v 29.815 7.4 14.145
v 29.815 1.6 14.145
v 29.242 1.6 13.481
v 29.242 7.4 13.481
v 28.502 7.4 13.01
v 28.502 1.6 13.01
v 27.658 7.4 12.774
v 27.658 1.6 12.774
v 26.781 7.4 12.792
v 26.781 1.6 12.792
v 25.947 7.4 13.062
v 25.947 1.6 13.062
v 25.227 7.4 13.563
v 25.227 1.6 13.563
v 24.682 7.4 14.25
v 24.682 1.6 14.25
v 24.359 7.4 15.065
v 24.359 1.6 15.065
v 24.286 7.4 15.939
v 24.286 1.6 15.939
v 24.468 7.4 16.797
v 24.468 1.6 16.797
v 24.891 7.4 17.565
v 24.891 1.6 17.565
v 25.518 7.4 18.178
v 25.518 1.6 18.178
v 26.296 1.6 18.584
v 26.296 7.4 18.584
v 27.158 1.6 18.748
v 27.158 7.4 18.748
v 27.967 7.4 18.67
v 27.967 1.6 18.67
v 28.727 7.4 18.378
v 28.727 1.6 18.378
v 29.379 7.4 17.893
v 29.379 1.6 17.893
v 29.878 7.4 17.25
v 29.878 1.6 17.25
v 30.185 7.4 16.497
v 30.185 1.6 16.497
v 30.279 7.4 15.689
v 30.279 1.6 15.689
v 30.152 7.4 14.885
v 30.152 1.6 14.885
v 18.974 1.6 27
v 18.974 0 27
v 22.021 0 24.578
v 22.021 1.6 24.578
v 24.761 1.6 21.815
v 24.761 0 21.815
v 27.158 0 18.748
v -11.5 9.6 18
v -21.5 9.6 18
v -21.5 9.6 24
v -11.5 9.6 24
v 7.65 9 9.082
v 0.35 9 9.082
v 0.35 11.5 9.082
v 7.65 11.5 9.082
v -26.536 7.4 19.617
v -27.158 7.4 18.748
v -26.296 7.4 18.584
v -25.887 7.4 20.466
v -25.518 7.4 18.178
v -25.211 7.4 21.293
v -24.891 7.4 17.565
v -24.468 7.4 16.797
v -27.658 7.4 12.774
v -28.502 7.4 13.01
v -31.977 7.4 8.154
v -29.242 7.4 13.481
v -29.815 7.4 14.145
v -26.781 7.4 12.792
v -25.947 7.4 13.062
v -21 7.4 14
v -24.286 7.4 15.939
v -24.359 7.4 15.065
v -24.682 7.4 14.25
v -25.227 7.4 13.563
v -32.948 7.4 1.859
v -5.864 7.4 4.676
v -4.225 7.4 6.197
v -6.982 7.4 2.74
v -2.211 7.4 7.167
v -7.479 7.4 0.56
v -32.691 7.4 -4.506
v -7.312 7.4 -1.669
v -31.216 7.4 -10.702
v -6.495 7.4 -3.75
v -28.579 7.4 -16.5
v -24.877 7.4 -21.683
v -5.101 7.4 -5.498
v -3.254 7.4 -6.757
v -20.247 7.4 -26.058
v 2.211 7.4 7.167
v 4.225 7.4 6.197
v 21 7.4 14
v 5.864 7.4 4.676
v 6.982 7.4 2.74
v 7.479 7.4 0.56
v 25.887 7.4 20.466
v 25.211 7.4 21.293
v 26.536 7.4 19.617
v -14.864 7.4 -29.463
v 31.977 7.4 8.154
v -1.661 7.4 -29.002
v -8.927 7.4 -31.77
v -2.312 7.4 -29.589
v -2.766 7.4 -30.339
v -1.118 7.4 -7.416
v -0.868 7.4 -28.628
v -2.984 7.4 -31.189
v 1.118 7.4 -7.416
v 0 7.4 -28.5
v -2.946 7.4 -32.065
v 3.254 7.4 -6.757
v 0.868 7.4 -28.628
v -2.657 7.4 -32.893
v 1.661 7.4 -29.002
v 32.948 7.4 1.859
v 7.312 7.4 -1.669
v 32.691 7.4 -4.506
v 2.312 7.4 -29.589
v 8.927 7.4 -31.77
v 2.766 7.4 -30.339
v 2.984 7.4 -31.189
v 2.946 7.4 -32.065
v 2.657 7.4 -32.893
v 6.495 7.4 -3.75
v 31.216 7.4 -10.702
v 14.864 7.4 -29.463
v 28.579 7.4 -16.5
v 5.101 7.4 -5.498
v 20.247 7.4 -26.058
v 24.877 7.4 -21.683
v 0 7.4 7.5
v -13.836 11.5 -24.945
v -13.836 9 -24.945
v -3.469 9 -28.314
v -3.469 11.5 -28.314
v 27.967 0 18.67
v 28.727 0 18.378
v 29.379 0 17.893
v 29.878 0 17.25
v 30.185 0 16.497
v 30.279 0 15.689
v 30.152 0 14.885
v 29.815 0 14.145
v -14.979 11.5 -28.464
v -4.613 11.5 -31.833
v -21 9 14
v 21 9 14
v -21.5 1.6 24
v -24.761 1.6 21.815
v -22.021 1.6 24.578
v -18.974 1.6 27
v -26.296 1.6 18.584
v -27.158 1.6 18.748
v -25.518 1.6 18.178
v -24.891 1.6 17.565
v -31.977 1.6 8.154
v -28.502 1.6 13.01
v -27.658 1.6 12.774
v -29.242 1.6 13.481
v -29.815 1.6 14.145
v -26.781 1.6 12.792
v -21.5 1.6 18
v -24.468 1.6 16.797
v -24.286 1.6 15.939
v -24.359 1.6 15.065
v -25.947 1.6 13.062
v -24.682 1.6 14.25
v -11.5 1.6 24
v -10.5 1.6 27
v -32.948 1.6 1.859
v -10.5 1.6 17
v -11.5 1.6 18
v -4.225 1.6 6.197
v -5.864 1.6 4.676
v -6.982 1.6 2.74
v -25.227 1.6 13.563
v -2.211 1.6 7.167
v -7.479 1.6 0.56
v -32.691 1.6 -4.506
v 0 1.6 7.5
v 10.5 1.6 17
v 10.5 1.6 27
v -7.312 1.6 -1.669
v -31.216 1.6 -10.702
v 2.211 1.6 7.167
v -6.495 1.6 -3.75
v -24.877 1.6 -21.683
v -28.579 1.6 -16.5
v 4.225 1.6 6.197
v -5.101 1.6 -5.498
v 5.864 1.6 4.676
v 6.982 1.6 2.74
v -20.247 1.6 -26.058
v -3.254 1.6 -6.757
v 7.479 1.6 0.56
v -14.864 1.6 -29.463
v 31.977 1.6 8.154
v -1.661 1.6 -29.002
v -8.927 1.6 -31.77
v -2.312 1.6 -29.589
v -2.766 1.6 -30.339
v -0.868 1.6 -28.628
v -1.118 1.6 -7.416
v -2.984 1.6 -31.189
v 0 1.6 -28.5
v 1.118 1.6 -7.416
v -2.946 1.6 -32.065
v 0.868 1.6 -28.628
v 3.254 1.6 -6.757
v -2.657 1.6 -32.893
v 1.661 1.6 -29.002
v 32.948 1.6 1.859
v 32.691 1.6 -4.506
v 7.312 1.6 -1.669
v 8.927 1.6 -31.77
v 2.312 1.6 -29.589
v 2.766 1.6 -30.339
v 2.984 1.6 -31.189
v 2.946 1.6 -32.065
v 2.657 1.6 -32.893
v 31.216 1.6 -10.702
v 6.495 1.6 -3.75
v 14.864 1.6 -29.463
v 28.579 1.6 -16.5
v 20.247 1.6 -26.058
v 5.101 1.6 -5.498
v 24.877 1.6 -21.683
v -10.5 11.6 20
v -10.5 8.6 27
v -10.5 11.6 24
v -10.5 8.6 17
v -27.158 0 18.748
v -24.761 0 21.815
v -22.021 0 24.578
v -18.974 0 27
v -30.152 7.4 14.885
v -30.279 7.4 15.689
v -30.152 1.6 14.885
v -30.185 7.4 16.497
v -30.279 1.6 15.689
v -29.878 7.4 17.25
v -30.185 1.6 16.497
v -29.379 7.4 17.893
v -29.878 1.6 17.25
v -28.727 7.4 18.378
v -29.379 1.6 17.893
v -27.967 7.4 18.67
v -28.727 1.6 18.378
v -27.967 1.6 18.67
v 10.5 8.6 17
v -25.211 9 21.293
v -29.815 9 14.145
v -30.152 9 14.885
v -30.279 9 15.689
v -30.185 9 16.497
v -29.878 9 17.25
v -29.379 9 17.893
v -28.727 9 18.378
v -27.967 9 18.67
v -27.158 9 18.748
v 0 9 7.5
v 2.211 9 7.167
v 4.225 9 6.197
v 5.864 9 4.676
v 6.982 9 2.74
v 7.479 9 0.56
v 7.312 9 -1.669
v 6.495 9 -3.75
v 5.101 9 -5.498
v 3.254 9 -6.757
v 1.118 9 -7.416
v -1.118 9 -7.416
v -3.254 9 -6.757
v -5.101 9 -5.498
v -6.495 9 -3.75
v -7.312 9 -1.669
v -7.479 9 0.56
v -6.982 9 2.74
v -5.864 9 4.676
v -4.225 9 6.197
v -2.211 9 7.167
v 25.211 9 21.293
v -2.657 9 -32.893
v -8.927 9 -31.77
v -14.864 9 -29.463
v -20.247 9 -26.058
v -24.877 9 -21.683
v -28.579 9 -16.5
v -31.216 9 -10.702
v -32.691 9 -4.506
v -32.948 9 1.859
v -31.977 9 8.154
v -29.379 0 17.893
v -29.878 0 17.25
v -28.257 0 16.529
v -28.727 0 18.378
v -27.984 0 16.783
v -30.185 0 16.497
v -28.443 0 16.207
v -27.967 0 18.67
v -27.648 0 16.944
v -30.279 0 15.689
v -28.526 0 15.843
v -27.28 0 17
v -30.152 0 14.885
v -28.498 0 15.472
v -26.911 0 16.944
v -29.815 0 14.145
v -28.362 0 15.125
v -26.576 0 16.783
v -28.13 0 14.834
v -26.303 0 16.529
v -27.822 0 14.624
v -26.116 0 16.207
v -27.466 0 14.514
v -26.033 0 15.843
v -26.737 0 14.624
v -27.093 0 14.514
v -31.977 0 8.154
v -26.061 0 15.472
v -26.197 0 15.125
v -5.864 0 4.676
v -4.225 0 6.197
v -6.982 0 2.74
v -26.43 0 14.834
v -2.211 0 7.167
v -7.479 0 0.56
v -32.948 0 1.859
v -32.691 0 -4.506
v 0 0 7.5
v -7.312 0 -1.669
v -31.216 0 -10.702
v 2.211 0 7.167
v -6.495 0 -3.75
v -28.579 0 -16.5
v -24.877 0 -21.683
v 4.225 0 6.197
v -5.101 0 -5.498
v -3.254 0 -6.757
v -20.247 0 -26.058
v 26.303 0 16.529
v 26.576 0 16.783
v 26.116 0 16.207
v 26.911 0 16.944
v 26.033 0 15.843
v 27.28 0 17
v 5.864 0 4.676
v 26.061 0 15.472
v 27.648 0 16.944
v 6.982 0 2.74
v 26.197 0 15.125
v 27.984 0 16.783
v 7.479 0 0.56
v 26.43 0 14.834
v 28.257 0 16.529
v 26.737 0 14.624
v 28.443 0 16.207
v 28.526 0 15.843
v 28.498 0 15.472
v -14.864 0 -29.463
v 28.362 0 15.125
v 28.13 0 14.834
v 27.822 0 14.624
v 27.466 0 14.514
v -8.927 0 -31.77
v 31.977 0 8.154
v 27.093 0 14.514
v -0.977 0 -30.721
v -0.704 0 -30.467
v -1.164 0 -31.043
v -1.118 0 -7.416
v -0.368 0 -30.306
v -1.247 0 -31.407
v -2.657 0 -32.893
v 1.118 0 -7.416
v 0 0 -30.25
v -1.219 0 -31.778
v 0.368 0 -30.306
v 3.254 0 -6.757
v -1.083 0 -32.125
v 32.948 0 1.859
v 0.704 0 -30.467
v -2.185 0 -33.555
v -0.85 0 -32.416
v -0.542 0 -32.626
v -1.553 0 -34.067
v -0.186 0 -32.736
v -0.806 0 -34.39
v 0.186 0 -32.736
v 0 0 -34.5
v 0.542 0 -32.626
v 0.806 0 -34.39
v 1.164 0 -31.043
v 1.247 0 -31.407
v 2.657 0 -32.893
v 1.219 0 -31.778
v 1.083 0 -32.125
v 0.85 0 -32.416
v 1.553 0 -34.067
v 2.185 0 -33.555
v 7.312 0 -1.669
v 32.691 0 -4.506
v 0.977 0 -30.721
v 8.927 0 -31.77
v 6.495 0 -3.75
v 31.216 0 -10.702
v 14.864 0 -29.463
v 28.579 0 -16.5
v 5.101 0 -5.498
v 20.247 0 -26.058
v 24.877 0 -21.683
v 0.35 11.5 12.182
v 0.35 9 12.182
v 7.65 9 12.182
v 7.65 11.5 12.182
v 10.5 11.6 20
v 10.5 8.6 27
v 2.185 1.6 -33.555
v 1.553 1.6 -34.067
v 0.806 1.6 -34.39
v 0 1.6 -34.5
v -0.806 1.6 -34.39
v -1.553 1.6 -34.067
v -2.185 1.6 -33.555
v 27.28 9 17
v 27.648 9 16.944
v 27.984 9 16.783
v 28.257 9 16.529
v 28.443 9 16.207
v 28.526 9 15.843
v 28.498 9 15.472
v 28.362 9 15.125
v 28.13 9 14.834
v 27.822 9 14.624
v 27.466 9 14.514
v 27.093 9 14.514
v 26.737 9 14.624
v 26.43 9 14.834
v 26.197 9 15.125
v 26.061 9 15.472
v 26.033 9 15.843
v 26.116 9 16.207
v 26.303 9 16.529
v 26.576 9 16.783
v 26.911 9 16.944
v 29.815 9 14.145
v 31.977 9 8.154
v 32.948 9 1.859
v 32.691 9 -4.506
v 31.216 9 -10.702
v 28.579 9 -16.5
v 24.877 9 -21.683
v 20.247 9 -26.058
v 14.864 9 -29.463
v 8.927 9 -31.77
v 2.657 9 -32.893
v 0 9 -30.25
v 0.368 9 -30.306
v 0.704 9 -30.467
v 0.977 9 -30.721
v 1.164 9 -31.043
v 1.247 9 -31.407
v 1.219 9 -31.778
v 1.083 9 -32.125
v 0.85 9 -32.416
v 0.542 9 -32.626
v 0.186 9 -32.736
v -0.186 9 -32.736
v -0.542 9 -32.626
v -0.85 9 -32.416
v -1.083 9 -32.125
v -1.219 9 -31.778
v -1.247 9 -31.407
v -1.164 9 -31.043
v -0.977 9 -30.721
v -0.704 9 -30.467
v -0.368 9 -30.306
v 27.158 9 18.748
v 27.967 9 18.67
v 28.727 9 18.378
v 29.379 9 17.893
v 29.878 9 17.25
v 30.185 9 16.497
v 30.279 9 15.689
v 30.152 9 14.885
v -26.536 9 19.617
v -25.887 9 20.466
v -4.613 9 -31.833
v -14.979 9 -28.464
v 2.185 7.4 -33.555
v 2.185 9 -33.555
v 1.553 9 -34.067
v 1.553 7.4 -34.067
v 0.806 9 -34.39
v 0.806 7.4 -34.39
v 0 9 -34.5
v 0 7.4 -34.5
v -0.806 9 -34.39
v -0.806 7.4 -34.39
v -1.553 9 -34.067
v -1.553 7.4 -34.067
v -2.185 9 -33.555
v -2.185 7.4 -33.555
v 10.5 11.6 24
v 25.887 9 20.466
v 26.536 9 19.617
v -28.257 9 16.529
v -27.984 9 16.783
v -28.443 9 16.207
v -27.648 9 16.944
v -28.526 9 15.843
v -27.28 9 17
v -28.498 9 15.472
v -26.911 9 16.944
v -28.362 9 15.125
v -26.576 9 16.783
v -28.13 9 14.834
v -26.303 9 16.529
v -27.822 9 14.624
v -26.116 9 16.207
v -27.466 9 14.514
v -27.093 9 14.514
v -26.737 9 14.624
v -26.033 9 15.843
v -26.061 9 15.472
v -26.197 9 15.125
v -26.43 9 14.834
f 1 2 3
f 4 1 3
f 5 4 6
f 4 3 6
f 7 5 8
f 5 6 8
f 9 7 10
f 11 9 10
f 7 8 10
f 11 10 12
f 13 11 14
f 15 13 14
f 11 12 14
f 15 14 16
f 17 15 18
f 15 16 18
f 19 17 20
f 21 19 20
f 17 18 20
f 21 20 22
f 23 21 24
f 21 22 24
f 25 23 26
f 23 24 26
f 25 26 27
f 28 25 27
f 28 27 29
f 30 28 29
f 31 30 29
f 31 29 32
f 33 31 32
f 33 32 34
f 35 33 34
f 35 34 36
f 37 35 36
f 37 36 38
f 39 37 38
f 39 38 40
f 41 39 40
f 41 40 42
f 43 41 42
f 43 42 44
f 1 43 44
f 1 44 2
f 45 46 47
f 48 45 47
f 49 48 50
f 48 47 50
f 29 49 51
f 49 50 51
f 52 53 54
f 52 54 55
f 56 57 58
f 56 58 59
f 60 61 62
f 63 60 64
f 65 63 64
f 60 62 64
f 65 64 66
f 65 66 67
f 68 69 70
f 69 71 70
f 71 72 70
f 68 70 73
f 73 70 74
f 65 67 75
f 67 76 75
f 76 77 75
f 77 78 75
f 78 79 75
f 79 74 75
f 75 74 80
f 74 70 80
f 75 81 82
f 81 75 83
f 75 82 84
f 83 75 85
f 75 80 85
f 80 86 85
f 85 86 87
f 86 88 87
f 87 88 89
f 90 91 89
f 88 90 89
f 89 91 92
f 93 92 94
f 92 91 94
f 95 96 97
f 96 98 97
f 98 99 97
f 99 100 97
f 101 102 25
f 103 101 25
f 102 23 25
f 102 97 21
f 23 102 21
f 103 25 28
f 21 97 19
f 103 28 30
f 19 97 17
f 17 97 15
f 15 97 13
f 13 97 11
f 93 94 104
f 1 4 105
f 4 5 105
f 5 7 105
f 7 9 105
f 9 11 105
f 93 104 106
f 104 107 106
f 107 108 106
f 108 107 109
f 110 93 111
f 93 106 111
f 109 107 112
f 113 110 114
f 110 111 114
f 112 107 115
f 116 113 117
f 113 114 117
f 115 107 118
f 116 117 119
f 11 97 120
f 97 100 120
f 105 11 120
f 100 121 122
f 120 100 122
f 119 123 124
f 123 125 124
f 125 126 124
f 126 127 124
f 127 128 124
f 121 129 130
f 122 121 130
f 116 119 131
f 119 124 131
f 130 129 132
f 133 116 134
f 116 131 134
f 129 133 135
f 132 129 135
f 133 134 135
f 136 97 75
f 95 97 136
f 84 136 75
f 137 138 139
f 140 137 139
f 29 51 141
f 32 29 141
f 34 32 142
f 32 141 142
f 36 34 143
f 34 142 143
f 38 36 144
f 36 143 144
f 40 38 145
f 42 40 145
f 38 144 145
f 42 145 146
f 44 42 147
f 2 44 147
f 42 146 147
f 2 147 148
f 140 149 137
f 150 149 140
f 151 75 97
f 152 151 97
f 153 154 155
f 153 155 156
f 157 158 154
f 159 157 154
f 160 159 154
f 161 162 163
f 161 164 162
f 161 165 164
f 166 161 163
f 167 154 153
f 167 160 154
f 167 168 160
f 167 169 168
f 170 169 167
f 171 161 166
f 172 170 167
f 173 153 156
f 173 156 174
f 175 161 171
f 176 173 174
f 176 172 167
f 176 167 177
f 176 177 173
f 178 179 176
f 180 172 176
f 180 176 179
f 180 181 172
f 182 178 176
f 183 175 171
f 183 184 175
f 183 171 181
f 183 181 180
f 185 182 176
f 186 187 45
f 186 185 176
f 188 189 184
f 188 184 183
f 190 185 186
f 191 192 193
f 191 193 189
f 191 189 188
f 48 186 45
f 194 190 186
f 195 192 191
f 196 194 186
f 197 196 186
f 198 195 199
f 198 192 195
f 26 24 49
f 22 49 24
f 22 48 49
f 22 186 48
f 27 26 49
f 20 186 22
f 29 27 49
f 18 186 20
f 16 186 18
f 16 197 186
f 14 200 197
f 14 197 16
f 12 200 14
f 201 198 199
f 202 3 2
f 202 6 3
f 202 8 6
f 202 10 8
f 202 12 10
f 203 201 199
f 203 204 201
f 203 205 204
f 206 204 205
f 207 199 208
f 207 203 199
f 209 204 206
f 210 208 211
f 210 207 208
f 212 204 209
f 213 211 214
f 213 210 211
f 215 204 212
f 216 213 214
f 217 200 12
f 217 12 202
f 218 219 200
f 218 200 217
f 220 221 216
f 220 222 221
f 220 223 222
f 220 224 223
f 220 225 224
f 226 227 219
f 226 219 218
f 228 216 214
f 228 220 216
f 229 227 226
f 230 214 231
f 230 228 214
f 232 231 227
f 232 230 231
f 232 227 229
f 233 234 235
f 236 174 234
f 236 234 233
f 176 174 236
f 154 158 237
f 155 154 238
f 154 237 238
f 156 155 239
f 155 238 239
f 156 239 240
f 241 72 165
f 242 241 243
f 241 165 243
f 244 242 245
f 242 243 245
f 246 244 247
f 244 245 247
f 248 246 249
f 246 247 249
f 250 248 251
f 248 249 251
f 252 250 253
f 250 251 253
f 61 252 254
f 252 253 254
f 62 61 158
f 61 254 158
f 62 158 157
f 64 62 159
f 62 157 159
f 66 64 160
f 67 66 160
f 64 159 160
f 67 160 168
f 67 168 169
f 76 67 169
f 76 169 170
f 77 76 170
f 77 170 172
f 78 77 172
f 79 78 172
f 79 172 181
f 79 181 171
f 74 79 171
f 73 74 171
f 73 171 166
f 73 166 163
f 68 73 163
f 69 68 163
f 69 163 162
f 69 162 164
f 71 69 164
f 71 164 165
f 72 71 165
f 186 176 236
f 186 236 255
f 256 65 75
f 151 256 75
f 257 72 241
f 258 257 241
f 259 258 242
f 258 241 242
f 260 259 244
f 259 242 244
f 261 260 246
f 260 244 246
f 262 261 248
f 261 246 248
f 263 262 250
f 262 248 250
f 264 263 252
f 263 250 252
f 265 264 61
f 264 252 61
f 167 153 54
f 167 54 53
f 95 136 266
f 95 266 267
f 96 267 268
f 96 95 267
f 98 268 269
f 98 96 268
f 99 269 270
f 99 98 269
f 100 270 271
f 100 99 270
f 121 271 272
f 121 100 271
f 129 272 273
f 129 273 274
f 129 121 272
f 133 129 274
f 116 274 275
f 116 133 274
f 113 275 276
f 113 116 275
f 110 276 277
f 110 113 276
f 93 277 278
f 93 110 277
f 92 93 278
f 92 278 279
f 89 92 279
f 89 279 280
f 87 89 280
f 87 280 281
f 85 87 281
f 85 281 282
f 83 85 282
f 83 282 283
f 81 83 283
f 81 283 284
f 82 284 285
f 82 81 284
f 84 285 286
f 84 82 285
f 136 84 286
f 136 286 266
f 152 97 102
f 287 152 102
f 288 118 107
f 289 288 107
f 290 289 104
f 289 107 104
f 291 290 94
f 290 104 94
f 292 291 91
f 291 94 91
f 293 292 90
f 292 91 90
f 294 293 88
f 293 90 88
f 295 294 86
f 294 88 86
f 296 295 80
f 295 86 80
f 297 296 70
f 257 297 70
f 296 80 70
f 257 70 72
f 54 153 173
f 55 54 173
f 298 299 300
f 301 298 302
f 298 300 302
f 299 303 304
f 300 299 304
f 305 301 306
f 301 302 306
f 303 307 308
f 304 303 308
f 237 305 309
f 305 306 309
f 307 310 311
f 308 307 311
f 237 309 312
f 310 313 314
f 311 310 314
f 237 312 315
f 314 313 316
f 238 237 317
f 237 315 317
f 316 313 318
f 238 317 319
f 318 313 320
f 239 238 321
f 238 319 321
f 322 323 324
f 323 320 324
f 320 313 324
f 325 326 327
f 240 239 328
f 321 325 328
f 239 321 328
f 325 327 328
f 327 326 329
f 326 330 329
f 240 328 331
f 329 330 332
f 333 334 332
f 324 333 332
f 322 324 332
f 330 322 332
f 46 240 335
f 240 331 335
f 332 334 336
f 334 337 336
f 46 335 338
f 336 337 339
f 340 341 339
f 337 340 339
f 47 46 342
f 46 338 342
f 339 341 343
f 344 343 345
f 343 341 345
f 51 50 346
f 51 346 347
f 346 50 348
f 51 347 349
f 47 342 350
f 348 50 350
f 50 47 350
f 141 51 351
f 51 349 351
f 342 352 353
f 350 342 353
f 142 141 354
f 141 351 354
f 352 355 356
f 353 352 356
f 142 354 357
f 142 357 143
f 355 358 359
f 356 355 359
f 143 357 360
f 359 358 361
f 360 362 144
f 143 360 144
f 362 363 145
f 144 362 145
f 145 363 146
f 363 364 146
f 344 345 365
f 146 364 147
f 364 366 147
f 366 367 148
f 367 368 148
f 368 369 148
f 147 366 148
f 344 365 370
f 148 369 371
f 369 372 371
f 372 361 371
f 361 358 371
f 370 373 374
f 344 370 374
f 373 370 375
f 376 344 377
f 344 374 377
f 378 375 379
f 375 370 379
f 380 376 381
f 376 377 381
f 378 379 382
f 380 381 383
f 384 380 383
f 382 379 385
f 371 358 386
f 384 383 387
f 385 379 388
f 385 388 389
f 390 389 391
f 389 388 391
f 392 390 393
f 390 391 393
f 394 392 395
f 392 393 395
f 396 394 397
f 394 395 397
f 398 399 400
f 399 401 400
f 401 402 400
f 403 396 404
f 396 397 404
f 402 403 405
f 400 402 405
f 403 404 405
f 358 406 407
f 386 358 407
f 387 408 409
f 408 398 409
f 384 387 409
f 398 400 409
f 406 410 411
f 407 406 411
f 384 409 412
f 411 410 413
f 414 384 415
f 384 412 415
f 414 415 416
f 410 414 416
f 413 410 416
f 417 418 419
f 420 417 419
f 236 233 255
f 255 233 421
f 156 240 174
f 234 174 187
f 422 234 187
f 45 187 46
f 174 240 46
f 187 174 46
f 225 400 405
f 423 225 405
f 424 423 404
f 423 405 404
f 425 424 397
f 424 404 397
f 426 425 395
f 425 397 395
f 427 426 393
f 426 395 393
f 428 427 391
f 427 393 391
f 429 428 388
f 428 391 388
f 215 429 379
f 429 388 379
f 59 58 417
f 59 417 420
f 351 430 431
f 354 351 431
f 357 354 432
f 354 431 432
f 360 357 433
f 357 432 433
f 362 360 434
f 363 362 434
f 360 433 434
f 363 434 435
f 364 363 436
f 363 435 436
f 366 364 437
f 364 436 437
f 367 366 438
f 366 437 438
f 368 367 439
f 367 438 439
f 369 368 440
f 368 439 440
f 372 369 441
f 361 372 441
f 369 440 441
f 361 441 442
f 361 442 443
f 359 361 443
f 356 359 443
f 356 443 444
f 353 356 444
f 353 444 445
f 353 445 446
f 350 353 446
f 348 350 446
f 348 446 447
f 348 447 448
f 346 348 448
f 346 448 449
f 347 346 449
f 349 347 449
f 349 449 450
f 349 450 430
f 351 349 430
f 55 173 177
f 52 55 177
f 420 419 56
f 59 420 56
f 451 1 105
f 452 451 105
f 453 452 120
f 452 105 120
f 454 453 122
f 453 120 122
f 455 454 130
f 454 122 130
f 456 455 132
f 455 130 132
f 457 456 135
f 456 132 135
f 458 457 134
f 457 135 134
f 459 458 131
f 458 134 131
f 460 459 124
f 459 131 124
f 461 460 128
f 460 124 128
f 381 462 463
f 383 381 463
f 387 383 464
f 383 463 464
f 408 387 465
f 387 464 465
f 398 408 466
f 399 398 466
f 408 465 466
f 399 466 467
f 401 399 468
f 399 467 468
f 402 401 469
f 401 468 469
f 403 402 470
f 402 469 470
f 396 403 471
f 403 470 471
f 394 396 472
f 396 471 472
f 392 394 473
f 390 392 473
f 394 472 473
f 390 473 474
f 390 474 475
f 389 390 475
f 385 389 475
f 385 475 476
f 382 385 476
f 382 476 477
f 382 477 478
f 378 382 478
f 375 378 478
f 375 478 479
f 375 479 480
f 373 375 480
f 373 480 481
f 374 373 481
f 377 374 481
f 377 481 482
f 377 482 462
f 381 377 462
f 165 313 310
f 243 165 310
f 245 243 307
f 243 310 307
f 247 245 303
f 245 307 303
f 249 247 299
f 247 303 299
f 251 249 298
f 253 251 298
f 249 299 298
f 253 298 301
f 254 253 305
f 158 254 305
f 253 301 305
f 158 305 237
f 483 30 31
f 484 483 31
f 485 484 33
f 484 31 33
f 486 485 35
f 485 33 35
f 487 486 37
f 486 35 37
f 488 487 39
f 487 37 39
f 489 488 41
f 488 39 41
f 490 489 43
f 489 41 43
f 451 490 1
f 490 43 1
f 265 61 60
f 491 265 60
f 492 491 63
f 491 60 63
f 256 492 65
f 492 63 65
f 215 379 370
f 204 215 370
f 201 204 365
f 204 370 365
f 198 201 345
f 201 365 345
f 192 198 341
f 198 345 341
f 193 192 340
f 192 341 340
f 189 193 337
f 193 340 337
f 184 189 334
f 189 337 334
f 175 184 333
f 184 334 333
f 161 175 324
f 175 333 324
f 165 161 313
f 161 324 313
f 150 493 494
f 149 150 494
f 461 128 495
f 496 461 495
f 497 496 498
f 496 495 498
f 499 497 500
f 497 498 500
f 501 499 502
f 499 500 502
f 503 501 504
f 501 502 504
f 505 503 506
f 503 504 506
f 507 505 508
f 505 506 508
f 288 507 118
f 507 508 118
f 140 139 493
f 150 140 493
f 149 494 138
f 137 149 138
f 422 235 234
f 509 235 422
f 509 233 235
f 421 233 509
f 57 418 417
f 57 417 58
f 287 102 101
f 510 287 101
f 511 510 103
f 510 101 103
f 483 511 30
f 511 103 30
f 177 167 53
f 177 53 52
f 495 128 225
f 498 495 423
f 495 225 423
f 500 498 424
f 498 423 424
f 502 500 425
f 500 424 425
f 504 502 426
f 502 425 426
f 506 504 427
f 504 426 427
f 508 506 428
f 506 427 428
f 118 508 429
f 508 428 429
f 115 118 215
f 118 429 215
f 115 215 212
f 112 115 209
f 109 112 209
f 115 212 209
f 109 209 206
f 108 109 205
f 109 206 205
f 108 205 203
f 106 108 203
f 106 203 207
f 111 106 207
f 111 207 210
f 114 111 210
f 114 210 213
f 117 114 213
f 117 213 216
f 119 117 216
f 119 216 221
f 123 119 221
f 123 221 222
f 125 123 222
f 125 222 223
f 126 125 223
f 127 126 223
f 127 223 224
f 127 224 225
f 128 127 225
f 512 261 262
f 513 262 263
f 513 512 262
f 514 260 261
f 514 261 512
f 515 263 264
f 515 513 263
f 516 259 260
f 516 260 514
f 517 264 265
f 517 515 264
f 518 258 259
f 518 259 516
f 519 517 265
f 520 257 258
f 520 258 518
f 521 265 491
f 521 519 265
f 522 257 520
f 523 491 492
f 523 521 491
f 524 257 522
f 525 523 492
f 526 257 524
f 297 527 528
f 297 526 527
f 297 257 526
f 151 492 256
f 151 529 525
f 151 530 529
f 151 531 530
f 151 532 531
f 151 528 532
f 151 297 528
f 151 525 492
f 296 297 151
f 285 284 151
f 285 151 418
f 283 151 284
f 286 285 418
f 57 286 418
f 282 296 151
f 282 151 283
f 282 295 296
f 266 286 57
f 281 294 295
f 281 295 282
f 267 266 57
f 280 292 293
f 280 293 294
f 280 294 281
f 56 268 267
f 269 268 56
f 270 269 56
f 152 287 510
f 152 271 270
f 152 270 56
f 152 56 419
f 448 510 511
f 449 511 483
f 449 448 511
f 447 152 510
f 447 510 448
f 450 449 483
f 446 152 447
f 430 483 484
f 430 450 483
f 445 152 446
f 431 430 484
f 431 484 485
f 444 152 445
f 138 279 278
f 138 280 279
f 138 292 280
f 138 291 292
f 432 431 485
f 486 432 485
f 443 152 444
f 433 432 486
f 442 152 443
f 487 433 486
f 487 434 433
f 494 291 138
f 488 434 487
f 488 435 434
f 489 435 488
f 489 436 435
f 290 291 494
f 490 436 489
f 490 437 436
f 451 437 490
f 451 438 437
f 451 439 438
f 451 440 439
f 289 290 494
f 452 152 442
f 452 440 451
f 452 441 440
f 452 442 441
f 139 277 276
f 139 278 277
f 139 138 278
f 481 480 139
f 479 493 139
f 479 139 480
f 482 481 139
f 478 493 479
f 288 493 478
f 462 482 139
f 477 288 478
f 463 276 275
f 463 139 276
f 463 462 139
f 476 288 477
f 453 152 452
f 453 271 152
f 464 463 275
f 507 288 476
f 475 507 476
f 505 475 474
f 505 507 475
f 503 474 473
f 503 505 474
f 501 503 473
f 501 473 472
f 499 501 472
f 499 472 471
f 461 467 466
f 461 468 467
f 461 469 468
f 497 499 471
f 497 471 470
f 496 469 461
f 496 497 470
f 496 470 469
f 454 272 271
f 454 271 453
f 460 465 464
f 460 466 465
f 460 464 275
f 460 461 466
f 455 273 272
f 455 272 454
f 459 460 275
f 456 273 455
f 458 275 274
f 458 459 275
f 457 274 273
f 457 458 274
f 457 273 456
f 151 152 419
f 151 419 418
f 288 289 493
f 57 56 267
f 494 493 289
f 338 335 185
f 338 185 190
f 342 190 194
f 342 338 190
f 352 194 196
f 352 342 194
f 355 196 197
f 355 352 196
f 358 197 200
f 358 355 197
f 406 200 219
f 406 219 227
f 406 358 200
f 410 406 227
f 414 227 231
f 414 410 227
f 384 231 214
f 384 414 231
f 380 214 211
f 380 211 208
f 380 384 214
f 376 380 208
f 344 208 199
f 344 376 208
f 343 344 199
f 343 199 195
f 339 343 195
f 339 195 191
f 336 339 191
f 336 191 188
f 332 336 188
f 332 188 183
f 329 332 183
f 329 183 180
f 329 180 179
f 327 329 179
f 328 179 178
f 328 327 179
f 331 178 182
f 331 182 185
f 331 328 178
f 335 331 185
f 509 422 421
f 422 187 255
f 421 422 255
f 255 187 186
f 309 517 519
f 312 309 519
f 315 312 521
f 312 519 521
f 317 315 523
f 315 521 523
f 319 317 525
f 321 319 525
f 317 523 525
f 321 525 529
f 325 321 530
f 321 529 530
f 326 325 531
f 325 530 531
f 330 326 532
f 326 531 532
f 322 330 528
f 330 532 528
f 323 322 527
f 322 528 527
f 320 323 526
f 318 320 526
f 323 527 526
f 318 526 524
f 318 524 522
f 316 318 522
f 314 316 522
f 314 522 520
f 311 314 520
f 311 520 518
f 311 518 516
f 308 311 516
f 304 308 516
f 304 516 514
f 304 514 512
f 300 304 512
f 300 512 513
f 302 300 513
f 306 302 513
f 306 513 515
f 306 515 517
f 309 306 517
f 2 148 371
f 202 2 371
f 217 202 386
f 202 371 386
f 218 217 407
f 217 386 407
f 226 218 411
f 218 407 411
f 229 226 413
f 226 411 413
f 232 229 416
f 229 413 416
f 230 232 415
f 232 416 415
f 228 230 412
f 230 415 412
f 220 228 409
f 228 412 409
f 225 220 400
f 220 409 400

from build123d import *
from build123d.topology import SkipClean

# Parameters (mm, degrees)
SKETCH_1_R          = 7.5
EXTRUDE_1_DEPTH     = 1.6
SKETCH_4_R          = 3
EXTRUDE_2_DEPTH     = 5.8
SKETCH_6_R          = 7.5
EXTRUDE_3_DEPTH     = 1.6
SKETCH_7_W          = 21
SKETCH_7_H          = 10
EXTRUDE_4_DEPTH     = 10
CHAMFER_1_SIZE      = 3
SKETCH_8_W          = 10
SKETCH_8_H          = 6
EXTRUDE_5_DEPTH     = 8
SKETCH_9_W          = 7.3
SKETCH_9_H          = 3.1
EXTRUDE_6_DEPTH     = 2.5
EXTRUDE_7_DEPTH     = 2.5
CUT_EXTRUDE_3_REACH = 50.582
SKETCH_11_R         = 1.25
CUT_EXTRUDE_4_REACH = 50.778


with BuildPart() as part:
    # 草图1 → 凸台-拉伸1 (new body)
    with BuildSketch(Plane(origin=(0, 0, 0), x_dir=(1, 0, 0), z_dir=(0, 1, 0))):
        with BuildLine():
            ThreePointArc((-2.65705645, 32.892857143), (-28.578838325, 16.5), (-29.814578114, -14.145350186))
            ThreePointArc((-29.814578114, -14.145350186), (-29.877876431, -17.25), (-27.157521664, -18.747506957))
            ThreePointArc((-27.157521664, -18.747506957), (0, -33), (27.157521664, -18.747506957))
            ThreePointArc((27.157521664, -18.747506957), (29.877876431, -17.25), (29.814578114, -14.145350186))
            ThreePointArc((29.814578114, -14.145350186), (28.578838325, 16.5), (2.65705645, 32.892857143))
            ThreePointArc((2.65705645, 32.892857143), (0, 34.5), (-2.65705645, 32.892857143))
        make_face()
        with Locations(Location((0, 0, 0), (0, 0, 270))):
            Circle(SKETCH_1_R, mode=Mode.SUBTRACT)
    extrude(amount=EXTRUDE_1_DEPTH)

    # 草图4 → 凸台-拉伸2 (add)
    with BuildSketch(Plane(origin=(0, 1.6, 0), x_dir=(1, 0, 0), z_dir=(0, 1, 0))):
        with Locations(Location((0, 31.5, 0), (0, 0, 27.664004496))):
            Circle(SKETCH_4_R)
        with Locations(Location((27.279800219, -15.75, 0), (0, 0, 32.335995504))):
            Circle(SKETCH_4_R)
        with Locations(Location((-27.279800219, -15.75, 0), (0, 0, 147.664004496))):
            Circle(SKETCH_4_R)
    extrude(amount=EXTRUDE_2_DEPTH)

    # 草图6 → 凸台-拉伸3 (add)
    with SkipClean():  # the faces are left unmerged after this step: merging them gives an invalid solid
        with BuildSketch(Plane(origin=(0, 7.4, 0), x_dir=(1, 0, 0), z_dir=(0, 1, 0))):
            with BuildLine():
                Line((-21, -14), (21, -14))
                Line((21, -14), (25.210881382, -21.293460498))
                ThreePointArc((25.210881382, -21.293460498), (26.215126916, -20.044129334), (27.157521664, -18.747506957))
                ThreePointArc((27.157521664, -18.747506957), (29.877876431, -17.25), (29.814578114, -14.145350186))
                ThreePointArc((29.814578114, -14.145350186), (28.578838325, 16.5), (2.65705645, 32.892857143))
                ThreePointArc((2.65705645, 32.892857143), (0, 34.5), (-2.65705645, 32.892857143))
                ThreePointArc((-2.65705645, 32.892857143), (-28.578838325, 16.5), (-29.814578114, -14.145350186))
                ThreePointArc((-29.814578114, -14.145350186), (-29.877876431, -17.25), (-27.157521664, -18.747506957))
                ThreePointArc((-27.157521664, -18.747506957), (-26.215126916, -20.044129334), (-25.210881382, -21.293460498))
                Line((-25.210881382, -21.293460498), (-21, -14))
            make_face()
            with Locations(Location((0, 0, 0), (0, 0, 270))):
                Circle(SKETCH_6_R, mode=Mode.SUBTRACT)
        extrude(amount=EXTRUDE_3_DEPTH)

    # 草图7 → 凸台-拉伸4 (add)
    with SkipClean():  # the faces are left unmerged after this step: merging them gives an invalid solid
        with BuildSketch(Plane(origin=(0, 1.6, 0), x_dir=(1, 0, 0), z_dir=(0, 1, 0))):
            with Locations((0, -22)):
                Rectangle(SKETCH_7_W, SKETCH_7_H)
        extrude(amount=EXTRUDE_4_DEPTH)

    # 倒角1
    chamfer_1_edges = [part.edges().sort_by_distance(p)[0] for p in [
        (0, 11.6, 17),
        (0, 11.6, 27),
    ]]
    chamfer(chamfer_1_edges, length=CHAMFER_1_SIZE)

    # 草图8 → 凸台-拉伸5 (add)
    with SkipClean():  # the faces are left unmerged after this step: merging them gives an invalid solid
        with BuildSketch(Plane(origin=(0, 1.6, 0), x_dir=(1, 0, 0), z_dir=(0, 1, 0))):
            with Locations((-16.5, -21)):
                Rectangle(SKETCH_8_W, SKETCH_8_H)
        extrude(amount=EXTRUDE_5_DEPTH)

    # 草图9 → 凸台-拉伸6 (add)
    with SkipClean():  # the faces are left unmerged after this step: merging them gives an invalid solid
        with BuildSketch(Plane(origin=(0, 9, 0), x_dir=(1, 0, 0), z_dir=(0, 1, 0))):
            with Locations((4, -10.632060859)):
                Rectangle(SKETCH_9_W, SKETCH_9_H)
        extrude(amount=EXTRUDE_6_DEPTH)

    # 草图10 → 凸台-拉伸7 (add)
    with SkipClean():  # the faces are left unmerged after this step: merging them gives an invalid solid
        with BuildSketch(Plane(origin=(0, 9, 0), x_dir=(1, 0, 0), z_dir=(0, 1, 0))):
            Polygon((-13.835733856, 24.945439837), (-3.469217829, 28.313725076), (-4.612580708, 31.832634186), (-14.979096735, 28.464348947), align=None)
        extrude(amount=EXTRUDE_7_DEPTH)

    # 草图11 → 切除-拉伸3 (cut, up to next)
    with BuildSketch(Plane(origin=(0, 9, 0), x_dir=(1, 0, 0), z_dir=(0, 1, 0)), mode=Mode.PRIVATE) as cut_extrude_3_sk1:
        with Locations(Location((0, 31.5, 0), (0, 0, 270))):
            Circle(SKETCH_11_R)
    cut_extrude_3_tool1 = extrude(cut_extrude_3_sk1.sketch, amount=-CUT_EXTRUDE_3_REACH, mode=Mode.PRIVATE) & part.part
    # 草图11 → 切除-拉伸3 (cut, up to next)
    with BuildSketch(Plane(origin=(0, 9, 0), x_dir=(1, 0, 0), z_dir=(0, 1, 0)), mode=Mode.PRIVATE) as cut_extrude_3_sk2:
        with Locations(Location((27.279800219, -15.75, 0), (0, 0, 270))):
            Circle(SKETCH_11_R)
    cut_extrude_3_tool2 = extrude(cut_extrude_3_sk2.sketch, amount=-CUT_EXTRUDE_3_REACH, mode=Mode.PRIVATE) & part.part
    # 草图11 → 切除-拉伸3 (cut, up to next)
    with BuildSketch(Plane(origin=(0, 9, 0), x_dir=(1, 0, 0), z_dir=(0, 1, 0)), mode=Mode.PRIVATE) as cut_extrude_3_sk3:
        with Locations(Location((-27.279800219, -15.75, 0), (0, 0, 270))):
            Circle(SKETCH_11_R)
    cut_extrude_3_tool3 = extrude(cut_extrude_3_sk3.sketch, amount=-CUT_EXTRUDE_3_REACH, mode=Mode.PRIVATE) & part.part
    add(cut_extrude_3_tool1.solids().sort_by_distance((0, 9, -31.5))[0], mode=Mode.SUBTRACT)
    add(cut_extrude_3_tool2.solids().sort_by_distance((27.2798, 9, 15.75))[0], mode=Mode.SUBTRACT)
    add(cut_extrude_3_tool3.solids().sort_by_distance((-27.2798, 9, 15.75))[0], mode=Mode.SUBTRACT)

    # 草图12 → 切除-拉伸4 (cut, up to next)
    with BuildSketch(Plane(origin=(0, 1.6, 0), x_dir=(1, 0, 0), z_dir=(0, 1, 0)), mode=Mode.PRIVATE) as cut_extrude_4_sk1:
        with BuildLine():
            Line((18.973665961, -27), (-18.973665961, -27))
            ThreePointArc((-18.973665961, -27), (0, -33), (18.973665961, -27))
        make_face()
    cut_extrude_4_tool1 = extrude(cut_extrude_4_sk1.sketch, amount=-CUT_EXTRUDE_4_REACH, mode=Mode.PRIVATE) & part.part
    add(cut_extrude_4_tool1.solids().sort_by_distance((0, 1.6, 29.419743))[0], mode=Mode.SUBTRACT)


solid = part.part
